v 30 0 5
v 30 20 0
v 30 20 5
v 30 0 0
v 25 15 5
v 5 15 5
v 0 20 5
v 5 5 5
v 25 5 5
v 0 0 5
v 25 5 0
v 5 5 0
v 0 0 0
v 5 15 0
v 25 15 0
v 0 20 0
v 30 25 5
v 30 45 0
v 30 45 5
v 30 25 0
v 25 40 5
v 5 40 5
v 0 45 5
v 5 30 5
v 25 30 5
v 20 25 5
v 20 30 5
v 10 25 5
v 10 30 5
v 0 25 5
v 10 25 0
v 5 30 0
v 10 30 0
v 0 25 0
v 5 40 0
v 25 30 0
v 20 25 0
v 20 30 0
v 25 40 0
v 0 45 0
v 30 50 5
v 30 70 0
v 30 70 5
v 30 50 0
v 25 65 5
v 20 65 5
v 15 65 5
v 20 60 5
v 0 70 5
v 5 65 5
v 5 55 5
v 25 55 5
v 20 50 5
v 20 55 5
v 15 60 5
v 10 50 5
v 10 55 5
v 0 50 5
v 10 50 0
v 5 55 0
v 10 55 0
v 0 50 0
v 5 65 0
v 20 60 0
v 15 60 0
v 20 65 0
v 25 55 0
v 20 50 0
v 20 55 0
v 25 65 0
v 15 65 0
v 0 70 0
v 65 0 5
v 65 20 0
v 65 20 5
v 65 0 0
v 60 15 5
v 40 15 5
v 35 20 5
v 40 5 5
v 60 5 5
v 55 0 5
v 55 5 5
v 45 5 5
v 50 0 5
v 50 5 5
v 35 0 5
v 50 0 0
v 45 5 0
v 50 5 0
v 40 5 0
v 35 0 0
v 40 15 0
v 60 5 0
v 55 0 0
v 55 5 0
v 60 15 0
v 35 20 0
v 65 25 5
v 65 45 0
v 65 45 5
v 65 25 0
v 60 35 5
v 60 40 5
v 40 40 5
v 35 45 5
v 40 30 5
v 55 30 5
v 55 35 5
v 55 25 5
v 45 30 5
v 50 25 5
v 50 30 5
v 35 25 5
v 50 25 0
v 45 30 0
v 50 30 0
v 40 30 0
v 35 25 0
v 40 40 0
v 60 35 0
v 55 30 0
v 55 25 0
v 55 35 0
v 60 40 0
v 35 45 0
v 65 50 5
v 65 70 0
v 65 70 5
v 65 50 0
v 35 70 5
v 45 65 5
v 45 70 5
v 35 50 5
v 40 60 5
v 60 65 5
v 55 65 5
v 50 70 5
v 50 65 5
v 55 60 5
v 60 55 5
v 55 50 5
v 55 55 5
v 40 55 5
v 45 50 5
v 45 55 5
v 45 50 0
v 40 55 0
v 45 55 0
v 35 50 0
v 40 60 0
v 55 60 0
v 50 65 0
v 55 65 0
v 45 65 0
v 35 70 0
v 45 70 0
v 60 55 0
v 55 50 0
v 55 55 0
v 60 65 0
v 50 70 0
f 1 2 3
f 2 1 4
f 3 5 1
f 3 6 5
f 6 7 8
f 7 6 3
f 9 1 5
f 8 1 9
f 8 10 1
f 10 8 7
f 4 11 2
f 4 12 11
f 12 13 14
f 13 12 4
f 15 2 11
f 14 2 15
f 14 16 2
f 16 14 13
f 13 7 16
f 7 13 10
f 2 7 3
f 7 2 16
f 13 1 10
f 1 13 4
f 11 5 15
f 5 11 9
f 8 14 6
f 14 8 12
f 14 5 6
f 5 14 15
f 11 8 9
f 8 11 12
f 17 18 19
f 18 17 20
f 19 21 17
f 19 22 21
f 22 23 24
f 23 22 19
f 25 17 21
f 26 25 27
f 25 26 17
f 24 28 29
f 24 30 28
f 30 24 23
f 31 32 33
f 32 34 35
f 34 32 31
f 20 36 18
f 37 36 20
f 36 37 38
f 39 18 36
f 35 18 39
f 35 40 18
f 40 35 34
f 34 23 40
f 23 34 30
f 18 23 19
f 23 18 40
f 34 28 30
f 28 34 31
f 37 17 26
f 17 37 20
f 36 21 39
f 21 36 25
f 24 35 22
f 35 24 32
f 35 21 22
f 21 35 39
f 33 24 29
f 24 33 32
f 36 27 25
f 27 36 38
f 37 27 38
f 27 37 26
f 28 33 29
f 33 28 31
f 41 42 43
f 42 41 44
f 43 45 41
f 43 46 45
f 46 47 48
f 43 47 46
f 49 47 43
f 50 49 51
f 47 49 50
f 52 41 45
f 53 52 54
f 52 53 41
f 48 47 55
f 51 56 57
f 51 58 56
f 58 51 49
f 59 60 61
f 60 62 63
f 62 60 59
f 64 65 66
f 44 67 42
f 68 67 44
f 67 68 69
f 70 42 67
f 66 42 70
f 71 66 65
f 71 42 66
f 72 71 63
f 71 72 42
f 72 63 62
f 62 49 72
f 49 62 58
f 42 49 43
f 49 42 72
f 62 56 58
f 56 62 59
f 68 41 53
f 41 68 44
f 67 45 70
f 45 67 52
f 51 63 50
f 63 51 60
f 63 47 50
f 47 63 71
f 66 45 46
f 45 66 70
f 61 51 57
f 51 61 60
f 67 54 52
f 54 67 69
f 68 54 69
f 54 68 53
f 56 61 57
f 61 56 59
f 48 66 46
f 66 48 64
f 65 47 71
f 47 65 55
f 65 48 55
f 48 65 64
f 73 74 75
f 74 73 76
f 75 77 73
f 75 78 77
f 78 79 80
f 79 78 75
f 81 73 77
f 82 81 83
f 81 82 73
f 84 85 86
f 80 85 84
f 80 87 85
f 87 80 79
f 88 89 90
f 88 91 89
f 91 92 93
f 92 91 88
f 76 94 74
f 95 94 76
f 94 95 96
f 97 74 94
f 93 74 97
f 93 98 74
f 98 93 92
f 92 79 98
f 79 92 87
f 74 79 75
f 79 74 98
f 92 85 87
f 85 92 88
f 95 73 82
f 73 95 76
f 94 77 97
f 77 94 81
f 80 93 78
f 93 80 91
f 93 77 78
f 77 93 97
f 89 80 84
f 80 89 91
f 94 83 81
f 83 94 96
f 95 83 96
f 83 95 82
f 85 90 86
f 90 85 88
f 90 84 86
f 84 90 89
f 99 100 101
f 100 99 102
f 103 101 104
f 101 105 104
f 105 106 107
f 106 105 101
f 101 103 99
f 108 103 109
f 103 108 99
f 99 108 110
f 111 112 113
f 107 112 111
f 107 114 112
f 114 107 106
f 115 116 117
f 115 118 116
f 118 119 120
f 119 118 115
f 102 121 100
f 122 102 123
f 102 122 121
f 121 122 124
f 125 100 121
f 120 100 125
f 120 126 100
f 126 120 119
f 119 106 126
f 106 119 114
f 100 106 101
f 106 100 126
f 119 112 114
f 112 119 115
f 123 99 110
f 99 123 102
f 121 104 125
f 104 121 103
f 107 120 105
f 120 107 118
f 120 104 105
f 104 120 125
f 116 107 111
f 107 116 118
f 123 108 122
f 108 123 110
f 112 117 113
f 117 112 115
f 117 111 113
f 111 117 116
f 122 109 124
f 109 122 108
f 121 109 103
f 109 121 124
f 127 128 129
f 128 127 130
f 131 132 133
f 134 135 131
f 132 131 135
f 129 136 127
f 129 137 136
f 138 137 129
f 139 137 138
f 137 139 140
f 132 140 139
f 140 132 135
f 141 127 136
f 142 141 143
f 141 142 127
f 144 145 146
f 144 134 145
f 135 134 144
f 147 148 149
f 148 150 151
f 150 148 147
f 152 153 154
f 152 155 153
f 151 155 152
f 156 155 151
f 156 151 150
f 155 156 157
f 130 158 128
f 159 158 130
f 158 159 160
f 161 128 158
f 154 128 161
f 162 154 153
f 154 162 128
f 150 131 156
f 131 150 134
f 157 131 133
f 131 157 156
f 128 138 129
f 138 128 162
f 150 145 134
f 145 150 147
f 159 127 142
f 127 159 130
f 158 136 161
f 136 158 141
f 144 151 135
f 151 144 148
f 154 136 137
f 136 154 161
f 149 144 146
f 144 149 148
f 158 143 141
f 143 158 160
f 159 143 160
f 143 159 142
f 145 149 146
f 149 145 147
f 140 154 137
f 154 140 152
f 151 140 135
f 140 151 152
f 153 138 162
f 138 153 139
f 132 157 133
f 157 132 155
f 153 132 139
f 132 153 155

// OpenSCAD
thick = 5; // size factor, mm

part1();
translate([0,5*thick,0]) part2();
translate([0,10*thick,0]) part3();
translate([7*thick,0, 0]) part4();
translate([7*thick,5*thick, 0]) part5();
translate([7*thick,10*thick,0]) part6();

module baseCube(b) { cube([6*b, 4*b, b]); }

// Part 1
module part1() {
    difference() {
        baseCube(thick);
        translate([thick, thick, 0]) cube([4*thick, 2*thick, thick]);
    }
}

// Part 2
module part2() {
    difference() {
        baseCube(thick);
        translate([thick, thick, 0]) cube([4*thick, 2*thick, thick]);
        translate([2*thick, 0, 0]) cube([2*thick, 2*thick, thick]);
    }
}

// Part 3
module part3() {
    union() {
        part2();
        translate([3*thick, 2*thick, 0]) cube(thick);
    }
}

// Part 4
module part4() {
    union() {
        part2();
        translate([2*thick, 0, 0]) cube(thick);
    }
}

// Part 5
module part5() {
    union() {
        part4();
        translate([4*thick, thick, 0]) cube(thick);
    }
}

// Part 6
module part6() {
    difference() {
        union() {part2(); translate([0, 2*thick, 0]) cube([4*thick, thick, thick]); }
        translate([2*thick, 3*thick, 0]) #cube(thick);
    }
}
